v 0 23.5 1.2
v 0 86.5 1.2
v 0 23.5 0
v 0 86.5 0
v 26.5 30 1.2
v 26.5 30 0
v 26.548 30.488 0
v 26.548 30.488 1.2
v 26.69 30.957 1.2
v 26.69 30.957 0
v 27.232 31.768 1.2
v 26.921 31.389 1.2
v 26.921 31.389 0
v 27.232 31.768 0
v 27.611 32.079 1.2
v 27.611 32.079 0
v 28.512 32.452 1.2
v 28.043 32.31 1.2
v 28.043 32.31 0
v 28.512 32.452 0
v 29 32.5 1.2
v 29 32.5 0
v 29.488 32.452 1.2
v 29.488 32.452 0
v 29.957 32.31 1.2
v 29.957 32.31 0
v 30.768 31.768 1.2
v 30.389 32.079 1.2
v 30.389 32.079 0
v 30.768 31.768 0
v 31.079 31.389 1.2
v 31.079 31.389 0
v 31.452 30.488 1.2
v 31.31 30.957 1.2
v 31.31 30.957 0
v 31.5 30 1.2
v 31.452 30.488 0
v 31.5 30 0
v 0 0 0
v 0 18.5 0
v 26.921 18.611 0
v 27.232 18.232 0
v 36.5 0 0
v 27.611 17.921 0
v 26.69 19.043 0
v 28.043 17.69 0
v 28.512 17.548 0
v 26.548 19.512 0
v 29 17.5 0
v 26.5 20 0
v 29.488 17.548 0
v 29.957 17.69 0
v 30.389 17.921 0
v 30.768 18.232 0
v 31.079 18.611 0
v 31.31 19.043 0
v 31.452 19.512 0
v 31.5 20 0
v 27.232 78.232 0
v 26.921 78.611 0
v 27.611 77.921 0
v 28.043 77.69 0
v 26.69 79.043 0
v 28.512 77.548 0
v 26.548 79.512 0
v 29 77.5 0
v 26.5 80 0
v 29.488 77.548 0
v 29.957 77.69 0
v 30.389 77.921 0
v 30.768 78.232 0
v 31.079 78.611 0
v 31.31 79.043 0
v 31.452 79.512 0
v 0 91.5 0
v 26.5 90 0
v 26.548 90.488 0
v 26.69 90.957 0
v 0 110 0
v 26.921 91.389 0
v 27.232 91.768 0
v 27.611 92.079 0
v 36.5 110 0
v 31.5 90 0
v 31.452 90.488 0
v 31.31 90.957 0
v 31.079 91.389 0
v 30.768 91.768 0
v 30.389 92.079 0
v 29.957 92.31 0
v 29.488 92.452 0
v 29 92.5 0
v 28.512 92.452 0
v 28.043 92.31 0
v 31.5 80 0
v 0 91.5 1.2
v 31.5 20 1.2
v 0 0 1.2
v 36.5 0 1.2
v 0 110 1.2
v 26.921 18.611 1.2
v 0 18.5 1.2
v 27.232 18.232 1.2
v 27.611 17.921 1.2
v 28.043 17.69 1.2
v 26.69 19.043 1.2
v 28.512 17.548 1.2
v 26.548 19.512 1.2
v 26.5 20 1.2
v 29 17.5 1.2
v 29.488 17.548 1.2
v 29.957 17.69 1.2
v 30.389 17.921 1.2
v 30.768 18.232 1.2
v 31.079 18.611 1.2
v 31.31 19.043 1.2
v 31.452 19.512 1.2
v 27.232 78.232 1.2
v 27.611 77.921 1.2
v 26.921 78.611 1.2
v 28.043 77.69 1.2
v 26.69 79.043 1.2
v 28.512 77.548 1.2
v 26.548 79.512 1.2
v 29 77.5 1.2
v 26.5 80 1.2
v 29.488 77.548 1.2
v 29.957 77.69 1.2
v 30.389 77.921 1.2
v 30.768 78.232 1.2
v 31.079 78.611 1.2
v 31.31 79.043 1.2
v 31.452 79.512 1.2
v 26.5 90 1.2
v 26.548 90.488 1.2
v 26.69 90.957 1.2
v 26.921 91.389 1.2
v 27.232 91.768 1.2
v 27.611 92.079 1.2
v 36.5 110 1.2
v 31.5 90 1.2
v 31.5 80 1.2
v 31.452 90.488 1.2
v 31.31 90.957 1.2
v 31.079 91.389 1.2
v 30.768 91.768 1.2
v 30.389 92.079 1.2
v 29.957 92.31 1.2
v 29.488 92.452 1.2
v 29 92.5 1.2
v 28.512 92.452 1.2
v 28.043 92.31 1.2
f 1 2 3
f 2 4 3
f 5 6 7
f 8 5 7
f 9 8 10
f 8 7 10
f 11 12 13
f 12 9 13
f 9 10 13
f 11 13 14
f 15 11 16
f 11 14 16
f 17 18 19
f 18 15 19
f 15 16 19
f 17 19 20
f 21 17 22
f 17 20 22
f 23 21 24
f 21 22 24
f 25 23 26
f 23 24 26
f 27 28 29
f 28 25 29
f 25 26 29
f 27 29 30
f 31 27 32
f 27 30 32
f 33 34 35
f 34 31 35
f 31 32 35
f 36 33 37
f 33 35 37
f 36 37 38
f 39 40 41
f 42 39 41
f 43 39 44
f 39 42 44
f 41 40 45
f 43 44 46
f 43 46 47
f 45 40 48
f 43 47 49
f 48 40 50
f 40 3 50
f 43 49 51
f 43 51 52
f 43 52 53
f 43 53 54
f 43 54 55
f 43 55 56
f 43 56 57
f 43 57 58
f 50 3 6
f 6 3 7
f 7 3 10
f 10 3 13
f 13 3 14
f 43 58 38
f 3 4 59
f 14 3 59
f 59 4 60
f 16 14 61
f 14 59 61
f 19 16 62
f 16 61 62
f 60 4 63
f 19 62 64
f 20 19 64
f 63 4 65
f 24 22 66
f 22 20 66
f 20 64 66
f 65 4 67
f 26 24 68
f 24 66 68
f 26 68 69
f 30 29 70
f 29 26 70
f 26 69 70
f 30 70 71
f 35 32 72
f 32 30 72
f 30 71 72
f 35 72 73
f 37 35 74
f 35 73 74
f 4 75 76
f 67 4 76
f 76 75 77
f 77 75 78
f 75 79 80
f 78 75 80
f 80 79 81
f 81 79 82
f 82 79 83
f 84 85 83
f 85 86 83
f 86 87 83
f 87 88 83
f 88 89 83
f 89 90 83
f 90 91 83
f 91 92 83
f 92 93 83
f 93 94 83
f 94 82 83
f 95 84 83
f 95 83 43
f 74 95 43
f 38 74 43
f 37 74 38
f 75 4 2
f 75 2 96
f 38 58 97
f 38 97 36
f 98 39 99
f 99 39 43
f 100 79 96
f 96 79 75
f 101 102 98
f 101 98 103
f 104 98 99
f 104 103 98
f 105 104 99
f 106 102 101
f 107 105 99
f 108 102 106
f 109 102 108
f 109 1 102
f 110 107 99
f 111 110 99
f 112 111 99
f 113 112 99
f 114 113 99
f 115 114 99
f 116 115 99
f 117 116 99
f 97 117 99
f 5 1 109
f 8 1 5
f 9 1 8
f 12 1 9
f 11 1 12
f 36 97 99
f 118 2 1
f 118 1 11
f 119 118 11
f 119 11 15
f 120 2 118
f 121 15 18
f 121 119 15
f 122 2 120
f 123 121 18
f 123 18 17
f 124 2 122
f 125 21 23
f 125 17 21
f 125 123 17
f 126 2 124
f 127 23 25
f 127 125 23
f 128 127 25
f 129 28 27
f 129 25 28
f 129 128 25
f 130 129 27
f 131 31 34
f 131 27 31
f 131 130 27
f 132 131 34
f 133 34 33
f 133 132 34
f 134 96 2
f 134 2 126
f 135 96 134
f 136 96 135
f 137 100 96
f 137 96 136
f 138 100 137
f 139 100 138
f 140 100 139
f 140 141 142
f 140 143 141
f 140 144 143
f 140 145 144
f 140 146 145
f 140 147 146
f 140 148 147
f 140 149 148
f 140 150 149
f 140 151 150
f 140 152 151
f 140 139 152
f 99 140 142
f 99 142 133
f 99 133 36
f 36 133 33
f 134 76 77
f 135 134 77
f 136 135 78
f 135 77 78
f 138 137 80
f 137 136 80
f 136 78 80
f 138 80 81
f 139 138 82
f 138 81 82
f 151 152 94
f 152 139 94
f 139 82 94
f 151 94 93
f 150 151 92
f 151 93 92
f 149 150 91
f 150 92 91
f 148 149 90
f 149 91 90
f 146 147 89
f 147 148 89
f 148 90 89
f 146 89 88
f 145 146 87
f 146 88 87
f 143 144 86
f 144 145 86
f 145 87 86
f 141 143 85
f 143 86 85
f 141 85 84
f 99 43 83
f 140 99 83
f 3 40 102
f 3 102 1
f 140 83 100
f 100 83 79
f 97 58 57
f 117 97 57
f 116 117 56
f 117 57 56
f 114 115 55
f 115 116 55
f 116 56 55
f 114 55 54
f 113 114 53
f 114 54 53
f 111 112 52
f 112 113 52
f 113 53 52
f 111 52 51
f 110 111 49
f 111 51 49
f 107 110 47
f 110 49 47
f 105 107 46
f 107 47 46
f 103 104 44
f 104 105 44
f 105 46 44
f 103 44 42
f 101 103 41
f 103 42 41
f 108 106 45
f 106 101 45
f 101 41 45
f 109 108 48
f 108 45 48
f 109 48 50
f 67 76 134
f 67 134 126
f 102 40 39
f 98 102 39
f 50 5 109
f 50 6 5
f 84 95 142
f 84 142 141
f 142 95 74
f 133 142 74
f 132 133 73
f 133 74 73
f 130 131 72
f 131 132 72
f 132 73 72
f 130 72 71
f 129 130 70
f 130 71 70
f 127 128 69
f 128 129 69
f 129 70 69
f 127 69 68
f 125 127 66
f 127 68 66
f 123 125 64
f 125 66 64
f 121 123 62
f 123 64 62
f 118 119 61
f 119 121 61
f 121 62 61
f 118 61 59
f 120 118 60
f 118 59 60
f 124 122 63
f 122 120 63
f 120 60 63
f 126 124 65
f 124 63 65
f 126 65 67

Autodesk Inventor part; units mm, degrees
ref_plane "YZ Plane" through (0, 0, 0) normal (1, 0, 0) x (0, 1, 0)
ref_plane "XZ Plane" through (0, 0, 0) normal (0, 1, 0) x (-1, 0, 0)
ref_plane "XY Plane" through (0, 0, 0) normal (0, 0, 1) x (1, 0, 0)
sketch "Skizze1" plane through (0, 0, 0) normal (0, 0, 1) x (1, 0, 0)
  line L0 (0, 0) -> (36.5, 0)
  line L1 (36.5, 0) -> (36.5, 110)
  line L2 (36.5, 110) -> (0, 110)
  line L3 (0, 110) -> (0, 91.5)
  line L4 (0, 86.5) -> (0, 91.5)
  line L5 (0, 18.5) -> (0, 23.5)
  line L6 (0, 23.5) -> (0, 18.5) construction
  line L7 (0, 18.5) -> (0, 0)
  line L8 (0, 86.5) -> (0, 23.5)
  line L9 (0, 91.5) -> (0, 86.5) construction
  line L10 (31.5, 90) -> (26.5, 90) construction
  line L11 (26.5, 90) -> (26.5, 80)
  line L12 (26.5, 80) -> (31.5, 80) construction
  line L13 (31.5, 80) -> (31.5, 90)
  line L14 (31.5, 30) -> (26.5, 30) construction
  line L15 (26.5, 30) -> (26.5, 20)
  line L16 (26.5, 20) -> (31.5, 20) construction
  line L17 (31.5, 20) -> (31.5, 30)
  line L18 (29, 80) -> (29, 30) construction
  line L19 (36.5, 55) -> (0, 55) construction
  arc A0 (31.5, 90) -> (26.5, 90) centre (29, 90) ccw
  arc A1 (26.5, 80) -> (31.5, 80) centre (29, 80) ccw
  arc A2 (31.5, 30) -> (26.5, 30) centre (29, 30) ccw
  arc A3 (26.5, 20) -> (31.5, 20) centre (29, 20) ccw
  point P0 (29, 55)
  dimension "d0" = 36.5
  dimension "d1" = 110
  dimension "d10" = 10
  dimension "d11" = 10
  dimension "d12" = 5
  dimension "d13" = 5
  dimension "d15" = 20
extrude "Extrusion2" add sketch "Skizze1" along normal blind 1.2
properties part number "bett_V2_deckplatte_klappe" material "Holz (Walnuss)"
